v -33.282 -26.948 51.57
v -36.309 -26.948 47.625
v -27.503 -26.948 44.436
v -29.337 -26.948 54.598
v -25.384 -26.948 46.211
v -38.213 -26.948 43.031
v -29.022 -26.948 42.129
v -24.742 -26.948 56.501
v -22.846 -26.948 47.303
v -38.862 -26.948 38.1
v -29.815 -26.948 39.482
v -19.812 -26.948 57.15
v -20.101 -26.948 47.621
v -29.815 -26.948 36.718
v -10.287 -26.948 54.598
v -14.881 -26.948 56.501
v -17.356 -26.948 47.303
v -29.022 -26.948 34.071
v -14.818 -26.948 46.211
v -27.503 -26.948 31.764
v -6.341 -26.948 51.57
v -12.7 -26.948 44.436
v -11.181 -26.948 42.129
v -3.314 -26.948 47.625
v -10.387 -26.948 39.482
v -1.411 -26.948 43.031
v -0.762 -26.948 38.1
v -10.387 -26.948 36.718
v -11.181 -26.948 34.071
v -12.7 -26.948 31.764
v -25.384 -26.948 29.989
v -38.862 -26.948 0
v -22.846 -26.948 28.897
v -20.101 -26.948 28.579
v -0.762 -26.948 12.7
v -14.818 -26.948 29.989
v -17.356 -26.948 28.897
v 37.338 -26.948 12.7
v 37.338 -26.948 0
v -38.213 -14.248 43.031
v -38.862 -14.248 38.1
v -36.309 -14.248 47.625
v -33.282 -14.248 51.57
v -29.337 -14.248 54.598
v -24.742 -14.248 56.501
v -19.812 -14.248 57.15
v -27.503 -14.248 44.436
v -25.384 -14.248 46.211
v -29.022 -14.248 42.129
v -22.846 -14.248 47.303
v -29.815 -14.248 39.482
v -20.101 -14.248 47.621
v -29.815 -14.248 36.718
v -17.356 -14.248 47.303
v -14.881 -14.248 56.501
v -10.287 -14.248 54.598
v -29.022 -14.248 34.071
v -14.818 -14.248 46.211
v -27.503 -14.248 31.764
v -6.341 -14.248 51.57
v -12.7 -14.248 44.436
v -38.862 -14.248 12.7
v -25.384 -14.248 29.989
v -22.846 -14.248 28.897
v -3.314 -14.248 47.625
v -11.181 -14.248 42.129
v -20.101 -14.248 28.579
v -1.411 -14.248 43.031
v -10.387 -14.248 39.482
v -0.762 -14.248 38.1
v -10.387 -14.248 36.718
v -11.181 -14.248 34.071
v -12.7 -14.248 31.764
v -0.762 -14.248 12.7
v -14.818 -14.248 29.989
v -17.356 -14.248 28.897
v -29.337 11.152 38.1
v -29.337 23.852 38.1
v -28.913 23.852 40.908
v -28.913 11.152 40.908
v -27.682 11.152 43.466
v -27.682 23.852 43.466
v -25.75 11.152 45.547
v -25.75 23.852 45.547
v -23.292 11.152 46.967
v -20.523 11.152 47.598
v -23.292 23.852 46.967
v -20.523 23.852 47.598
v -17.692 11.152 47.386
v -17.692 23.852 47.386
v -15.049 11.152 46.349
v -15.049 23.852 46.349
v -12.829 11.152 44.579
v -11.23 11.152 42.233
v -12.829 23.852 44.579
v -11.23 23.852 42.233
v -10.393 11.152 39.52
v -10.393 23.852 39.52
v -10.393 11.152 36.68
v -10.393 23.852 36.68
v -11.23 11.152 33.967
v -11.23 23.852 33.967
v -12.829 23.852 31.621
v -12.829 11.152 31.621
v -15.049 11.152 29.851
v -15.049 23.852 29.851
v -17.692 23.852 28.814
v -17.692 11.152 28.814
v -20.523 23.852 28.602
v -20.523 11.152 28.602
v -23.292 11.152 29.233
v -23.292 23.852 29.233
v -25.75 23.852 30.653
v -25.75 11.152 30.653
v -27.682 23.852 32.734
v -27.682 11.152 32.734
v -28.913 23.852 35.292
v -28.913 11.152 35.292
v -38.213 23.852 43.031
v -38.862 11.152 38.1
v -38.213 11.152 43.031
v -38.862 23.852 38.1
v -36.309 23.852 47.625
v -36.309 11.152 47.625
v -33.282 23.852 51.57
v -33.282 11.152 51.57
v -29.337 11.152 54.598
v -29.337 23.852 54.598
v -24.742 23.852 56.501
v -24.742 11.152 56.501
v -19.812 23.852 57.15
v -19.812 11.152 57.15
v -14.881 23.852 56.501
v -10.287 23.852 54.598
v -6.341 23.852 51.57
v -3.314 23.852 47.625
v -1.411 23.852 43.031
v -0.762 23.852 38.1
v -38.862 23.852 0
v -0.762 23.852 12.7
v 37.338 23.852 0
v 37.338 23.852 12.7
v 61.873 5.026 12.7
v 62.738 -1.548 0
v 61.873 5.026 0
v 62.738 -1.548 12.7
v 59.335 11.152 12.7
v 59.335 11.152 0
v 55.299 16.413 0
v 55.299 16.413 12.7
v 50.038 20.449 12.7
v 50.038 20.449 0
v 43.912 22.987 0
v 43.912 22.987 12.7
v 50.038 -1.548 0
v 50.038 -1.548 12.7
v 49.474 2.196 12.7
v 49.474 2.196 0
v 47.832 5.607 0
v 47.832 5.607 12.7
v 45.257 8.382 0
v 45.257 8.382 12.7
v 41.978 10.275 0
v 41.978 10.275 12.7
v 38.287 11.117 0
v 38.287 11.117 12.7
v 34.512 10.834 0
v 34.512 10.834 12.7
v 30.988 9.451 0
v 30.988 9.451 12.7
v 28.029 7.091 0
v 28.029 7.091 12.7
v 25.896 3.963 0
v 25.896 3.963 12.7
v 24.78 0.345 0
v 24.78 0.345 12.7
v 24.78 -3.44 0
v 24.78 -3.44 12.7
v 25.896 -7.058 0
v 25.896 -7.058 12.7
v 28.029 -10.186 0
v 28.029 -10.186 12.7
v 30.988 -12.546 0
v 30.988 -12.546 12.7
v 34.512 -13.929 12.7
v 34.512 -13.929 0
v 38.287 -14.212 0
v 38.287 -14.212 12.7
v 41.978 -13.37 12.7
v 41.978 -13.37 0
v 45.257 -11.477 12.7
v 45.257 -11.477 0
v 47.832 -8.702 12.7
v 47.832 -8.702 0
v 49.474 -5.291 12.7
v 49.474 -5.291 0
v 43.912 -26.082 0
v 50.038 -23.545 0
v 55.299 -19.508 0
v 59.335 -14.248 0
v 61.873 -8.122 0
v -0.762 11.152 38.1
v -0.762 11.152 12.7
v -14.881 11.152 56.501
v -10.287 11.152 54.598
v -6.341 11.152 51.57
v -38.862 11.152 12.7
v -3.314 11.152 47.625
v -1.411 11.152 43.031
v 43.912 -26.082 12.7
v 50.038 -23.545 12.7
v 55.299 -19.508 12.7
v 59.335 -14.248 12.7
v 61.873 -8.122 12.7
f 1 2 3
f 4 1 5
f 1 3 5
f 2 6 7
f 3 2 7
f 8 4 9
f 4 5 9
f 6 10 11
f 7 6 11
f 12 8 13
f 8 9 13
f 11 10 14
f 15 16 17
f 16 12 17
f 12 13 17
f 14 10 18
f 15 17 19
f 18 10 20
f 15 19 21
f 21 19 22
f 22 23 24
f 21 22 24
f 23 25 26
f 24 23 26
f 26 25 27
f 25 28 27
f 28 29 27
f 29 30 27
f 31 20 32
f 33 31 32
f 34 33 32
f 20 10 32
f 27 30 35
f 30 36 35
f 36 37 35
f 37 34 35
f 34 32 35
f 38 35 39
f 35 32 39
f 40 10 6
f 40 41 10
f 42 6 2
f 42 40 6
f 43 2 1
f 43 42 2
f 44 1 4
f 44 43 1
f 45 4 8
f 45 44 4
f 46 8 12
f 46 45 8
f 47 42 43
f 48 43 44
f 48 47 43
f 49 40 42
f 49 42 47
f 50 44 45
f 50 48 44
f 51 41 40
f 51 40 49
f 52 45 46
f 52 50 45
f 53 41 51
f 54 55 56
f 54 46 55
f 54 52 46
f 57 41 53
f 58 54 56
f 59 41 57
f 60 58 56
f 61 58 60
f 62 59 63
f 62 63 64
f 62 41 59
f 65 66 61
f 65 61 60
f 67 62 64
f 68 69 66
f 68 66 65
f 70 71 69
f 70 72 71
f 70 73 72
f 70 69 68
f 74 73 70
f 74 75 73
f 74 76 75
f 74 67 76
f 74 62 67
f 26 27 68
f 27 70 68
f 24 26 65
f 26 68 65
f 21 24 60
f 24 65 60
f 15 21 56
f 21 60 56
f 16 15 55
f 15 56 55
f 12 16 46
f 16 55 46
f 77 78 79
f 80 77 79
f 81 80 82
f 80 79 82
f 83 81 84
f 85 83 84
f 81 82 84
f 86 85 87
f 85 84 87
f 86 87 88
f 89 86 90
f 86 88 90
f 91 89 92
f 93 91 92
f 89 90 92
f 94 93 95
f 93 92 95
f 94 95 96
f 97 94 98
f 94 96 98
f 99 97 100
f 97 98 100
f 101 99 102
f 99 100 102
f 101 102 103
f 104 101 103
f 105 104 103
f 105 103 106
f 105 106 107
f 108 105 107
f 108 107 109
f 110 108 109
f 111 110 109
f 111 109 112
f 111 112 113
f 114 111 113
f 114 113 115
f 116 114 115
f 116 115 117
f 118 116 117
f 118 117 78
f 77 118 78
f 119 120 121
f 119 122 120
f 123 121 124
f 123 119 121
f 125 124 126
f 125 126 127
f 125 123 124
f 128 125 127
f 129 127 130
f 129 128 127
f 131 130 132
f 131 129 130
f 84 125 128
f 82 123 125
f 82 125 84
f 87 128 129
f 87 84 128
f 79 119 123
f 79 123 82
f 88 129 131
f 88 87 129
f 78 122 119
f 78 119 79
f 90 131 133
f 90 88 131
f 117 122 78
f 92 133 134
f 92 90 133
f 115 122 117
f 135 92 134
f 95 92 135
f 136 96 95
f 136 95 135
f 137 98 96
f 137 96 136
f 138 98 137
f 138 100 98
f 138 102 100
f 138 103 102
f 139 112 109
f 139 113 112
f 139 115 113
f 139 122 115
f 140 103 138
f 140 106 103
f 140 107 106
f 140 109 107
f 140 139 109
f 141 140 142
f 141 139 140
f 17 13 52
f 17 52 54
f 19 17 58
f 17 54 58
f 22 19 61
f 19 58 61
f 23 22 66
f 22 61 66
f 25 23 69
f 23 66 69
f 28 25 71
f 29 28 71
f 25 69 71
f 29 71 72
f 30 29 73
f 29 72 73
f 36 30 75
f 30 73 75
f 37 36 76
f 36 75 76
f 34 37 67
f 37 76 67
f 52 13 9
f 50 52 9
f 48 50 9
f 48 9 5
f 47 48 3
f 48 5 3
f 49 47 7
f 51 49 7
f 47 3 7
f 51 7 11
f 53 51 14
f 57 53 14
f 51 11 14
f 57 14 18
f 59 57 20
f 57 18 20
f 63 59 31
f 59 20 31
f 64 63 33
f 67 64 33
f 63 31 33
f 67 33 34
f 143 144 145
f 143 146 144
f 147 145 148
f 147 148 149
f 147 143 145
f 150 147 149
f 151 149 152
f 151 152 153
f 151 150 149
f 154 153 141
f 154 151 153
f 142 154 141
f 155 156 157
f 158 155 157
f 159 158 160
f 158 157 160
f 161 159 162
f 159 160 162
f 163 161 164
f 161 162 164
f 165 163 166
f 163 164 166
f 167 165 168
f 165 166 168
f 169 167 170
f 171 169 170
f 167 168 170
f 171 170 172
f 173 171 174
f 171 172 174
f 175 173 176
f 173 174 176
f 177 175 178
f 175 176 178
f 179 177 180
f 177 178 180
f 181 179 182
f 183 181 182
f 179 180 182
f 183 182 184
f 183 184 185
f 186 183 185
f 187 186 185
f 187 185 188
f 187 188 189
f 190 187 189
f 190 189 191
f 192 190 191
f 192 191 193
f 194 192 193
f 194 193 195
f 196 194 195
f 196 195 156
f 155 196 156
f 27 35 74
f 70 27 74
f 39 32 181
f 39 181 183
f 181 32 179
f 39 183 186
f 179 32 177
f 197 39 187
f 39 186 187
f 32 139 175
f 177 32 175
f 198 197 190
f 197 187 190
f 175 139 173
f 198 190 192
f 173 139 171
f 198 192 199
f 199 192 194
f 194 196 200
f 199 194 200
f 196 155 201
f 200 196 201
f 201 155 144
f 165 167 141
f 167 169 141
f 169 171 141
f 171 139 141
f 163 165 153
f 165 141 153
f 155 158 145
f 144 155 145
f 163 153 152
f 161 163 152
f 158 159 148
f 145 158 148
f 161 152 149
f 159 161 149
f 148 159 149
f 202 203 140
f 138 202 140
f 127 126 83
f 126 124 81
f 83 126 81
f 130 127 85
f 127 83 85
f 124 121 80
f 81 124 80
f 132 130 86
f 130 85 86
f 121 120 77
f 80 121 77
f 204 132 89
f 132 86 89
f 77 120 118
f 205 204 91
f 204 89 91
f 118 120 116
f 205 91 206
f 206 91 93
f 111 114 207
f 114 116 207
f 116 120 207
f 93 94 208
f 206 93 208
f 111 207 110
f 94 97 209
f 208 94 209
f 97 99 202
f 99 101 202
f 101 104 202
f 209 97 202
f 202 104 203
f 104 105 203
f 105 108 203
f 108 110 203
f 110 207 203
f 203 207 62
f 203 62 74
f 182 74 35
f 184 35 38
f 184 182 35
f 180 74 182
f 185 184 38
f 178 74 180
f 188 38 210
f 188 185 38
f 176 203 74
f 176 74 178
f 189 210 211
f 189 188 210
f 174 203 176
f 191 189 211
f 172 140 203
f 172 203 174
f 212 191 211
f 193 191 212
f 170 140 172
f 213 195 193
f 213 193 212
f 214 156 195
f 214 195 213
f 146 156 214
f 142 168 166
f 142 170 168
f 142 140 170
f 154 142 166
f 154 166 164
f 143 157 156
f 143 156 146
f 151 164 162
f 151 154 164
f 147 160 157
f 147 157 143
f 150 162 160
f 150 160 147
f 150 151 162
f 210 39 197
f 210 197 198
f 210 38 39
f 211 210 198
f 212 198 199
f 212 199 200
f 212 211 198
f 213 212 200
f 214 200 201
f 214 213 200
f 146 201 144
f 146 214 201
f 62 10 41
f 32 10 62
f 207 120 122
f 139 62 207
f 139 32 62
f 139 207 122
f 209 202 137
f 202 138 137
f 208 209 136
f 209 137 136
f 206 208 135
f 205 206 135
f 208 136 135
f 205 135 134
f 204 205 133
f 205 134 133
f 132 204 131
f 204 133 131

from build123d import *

# Parameters (mm, degrees)
F0_W      = 101.6
F0_H      = 50.8
F1_DEPTH  = 12.7
F3_R      = 25.39999
F2_R      = 12.7
F4_DEPTH  = 12.701
F5_W      = 38.1
F5_H      = 12.7
F6_DEPTH  = 44.45
F7_R      = 19.04999
F8_R      = 9.525
F9_DEPTH  = 50.801
F10_W     = 38.1
F10_H     = 12.7
F11_DEPTH = 44.45
F12_R     = 19.04999
F13_R     = 9.525
F14_DEPTH = 50.801


# Not quite as in the source:
# - a fillet or chamfer is up to 0.001 mm smaller than in the source, because OpenCascade refuses the exact size


with BuildPart() as f1:
    # F0 (on Top) → F1 (new body)
    with BuildSketch(Plane.XY):
        with Locations((11.9383526917, -1.5475824475)):
            Rectangle(F0_W, F0_H)
    extrude(amount=F1_DEPTH)

    # F3 (radius 25.4 in the source; OpenCascade refuses exactly that, so slightly less here)
    f3_edges = [f1.edges().sort_by_distance(p)[0] for p in [
        (62.738353, -26.947582, 6.35),
        (62.738353, 23.852418, 6.35),
    ]]
    fillet(f3_edges, radius=F3_R)

    # F2 (on face) → F4 (cut, through all)
    with BuildSketch(Plane.XY.offset(12.7)):
        with Locations((37.3383526917, -1.5475824475)):
            Circle(F2_R)
    extrude(amount=-F4_DEPTH, mode=Mode.SUBTRACT)

    # F5 (on face) → F6 (join)
    with BuildSketch(Plane.XY.offset(12.7)):
        with Locations((-19.8116473083, -20.5975824475)):
            Rectangle(F5_W, F5_H)
    extrude(amount=F6_DEPTH)

    # F7 (radius 19.05 in the source; OpenCascade refuses exactly that, so slightly less here)
    f7_edges = [f1.edges().sort_by_distance(p)[0] for p in [
        (-38.861647, -20.597582, 57.15),
        (-0.761647, -20.597582, 57.15),
    ]]
    fillet(f7_edges, radius=F7_R)

    # F8 (on face) → F9 (cut, through all)
    with BuildSketch(Plane.XZ.offset(26.9475824475)):
        with Locations((-20.3908979893, 38.1)):
            Circle(F8_R)
    extrude(amount=-F9_DEPTH, mode=Mode.SUBTRACT)

    # F10 (on face) → F11 (join)
    with BuildSketch(Plane.XY.offset(12.7)):
        with Locations((-19.8116473083, 17.5024175525)):
            Rectangle(F10_W, F10_H)
    extrude(amount=F11_DEPTH)

    # F12 (radius 19.05 in the source; OpenCascade refuses exactly that, so slightly less here)
    f12_edges = [f1.edges().sort_by_distance(p)[0] for p in [
        (-0.761647, 17.502418, 57.15),
        (-38.861647, 17.502418, 57.15),
    ]]
    fillet(f12_edges, radius=F12_R)

    # F13 (on face) → F14 (cut, through all)
    with BuildSketch(Plane(origin=(0, 23.8524175525, 0), x_dir=(-1, 0, 0), z_dir=(0, 1, 0))):
        with Locations((19.8116473083, 38.1)):
            Circle(F13_R)
    extrude(amount=-F14_DEPTH, mode=Mode.SUBTRACT)


solid = f1.part
